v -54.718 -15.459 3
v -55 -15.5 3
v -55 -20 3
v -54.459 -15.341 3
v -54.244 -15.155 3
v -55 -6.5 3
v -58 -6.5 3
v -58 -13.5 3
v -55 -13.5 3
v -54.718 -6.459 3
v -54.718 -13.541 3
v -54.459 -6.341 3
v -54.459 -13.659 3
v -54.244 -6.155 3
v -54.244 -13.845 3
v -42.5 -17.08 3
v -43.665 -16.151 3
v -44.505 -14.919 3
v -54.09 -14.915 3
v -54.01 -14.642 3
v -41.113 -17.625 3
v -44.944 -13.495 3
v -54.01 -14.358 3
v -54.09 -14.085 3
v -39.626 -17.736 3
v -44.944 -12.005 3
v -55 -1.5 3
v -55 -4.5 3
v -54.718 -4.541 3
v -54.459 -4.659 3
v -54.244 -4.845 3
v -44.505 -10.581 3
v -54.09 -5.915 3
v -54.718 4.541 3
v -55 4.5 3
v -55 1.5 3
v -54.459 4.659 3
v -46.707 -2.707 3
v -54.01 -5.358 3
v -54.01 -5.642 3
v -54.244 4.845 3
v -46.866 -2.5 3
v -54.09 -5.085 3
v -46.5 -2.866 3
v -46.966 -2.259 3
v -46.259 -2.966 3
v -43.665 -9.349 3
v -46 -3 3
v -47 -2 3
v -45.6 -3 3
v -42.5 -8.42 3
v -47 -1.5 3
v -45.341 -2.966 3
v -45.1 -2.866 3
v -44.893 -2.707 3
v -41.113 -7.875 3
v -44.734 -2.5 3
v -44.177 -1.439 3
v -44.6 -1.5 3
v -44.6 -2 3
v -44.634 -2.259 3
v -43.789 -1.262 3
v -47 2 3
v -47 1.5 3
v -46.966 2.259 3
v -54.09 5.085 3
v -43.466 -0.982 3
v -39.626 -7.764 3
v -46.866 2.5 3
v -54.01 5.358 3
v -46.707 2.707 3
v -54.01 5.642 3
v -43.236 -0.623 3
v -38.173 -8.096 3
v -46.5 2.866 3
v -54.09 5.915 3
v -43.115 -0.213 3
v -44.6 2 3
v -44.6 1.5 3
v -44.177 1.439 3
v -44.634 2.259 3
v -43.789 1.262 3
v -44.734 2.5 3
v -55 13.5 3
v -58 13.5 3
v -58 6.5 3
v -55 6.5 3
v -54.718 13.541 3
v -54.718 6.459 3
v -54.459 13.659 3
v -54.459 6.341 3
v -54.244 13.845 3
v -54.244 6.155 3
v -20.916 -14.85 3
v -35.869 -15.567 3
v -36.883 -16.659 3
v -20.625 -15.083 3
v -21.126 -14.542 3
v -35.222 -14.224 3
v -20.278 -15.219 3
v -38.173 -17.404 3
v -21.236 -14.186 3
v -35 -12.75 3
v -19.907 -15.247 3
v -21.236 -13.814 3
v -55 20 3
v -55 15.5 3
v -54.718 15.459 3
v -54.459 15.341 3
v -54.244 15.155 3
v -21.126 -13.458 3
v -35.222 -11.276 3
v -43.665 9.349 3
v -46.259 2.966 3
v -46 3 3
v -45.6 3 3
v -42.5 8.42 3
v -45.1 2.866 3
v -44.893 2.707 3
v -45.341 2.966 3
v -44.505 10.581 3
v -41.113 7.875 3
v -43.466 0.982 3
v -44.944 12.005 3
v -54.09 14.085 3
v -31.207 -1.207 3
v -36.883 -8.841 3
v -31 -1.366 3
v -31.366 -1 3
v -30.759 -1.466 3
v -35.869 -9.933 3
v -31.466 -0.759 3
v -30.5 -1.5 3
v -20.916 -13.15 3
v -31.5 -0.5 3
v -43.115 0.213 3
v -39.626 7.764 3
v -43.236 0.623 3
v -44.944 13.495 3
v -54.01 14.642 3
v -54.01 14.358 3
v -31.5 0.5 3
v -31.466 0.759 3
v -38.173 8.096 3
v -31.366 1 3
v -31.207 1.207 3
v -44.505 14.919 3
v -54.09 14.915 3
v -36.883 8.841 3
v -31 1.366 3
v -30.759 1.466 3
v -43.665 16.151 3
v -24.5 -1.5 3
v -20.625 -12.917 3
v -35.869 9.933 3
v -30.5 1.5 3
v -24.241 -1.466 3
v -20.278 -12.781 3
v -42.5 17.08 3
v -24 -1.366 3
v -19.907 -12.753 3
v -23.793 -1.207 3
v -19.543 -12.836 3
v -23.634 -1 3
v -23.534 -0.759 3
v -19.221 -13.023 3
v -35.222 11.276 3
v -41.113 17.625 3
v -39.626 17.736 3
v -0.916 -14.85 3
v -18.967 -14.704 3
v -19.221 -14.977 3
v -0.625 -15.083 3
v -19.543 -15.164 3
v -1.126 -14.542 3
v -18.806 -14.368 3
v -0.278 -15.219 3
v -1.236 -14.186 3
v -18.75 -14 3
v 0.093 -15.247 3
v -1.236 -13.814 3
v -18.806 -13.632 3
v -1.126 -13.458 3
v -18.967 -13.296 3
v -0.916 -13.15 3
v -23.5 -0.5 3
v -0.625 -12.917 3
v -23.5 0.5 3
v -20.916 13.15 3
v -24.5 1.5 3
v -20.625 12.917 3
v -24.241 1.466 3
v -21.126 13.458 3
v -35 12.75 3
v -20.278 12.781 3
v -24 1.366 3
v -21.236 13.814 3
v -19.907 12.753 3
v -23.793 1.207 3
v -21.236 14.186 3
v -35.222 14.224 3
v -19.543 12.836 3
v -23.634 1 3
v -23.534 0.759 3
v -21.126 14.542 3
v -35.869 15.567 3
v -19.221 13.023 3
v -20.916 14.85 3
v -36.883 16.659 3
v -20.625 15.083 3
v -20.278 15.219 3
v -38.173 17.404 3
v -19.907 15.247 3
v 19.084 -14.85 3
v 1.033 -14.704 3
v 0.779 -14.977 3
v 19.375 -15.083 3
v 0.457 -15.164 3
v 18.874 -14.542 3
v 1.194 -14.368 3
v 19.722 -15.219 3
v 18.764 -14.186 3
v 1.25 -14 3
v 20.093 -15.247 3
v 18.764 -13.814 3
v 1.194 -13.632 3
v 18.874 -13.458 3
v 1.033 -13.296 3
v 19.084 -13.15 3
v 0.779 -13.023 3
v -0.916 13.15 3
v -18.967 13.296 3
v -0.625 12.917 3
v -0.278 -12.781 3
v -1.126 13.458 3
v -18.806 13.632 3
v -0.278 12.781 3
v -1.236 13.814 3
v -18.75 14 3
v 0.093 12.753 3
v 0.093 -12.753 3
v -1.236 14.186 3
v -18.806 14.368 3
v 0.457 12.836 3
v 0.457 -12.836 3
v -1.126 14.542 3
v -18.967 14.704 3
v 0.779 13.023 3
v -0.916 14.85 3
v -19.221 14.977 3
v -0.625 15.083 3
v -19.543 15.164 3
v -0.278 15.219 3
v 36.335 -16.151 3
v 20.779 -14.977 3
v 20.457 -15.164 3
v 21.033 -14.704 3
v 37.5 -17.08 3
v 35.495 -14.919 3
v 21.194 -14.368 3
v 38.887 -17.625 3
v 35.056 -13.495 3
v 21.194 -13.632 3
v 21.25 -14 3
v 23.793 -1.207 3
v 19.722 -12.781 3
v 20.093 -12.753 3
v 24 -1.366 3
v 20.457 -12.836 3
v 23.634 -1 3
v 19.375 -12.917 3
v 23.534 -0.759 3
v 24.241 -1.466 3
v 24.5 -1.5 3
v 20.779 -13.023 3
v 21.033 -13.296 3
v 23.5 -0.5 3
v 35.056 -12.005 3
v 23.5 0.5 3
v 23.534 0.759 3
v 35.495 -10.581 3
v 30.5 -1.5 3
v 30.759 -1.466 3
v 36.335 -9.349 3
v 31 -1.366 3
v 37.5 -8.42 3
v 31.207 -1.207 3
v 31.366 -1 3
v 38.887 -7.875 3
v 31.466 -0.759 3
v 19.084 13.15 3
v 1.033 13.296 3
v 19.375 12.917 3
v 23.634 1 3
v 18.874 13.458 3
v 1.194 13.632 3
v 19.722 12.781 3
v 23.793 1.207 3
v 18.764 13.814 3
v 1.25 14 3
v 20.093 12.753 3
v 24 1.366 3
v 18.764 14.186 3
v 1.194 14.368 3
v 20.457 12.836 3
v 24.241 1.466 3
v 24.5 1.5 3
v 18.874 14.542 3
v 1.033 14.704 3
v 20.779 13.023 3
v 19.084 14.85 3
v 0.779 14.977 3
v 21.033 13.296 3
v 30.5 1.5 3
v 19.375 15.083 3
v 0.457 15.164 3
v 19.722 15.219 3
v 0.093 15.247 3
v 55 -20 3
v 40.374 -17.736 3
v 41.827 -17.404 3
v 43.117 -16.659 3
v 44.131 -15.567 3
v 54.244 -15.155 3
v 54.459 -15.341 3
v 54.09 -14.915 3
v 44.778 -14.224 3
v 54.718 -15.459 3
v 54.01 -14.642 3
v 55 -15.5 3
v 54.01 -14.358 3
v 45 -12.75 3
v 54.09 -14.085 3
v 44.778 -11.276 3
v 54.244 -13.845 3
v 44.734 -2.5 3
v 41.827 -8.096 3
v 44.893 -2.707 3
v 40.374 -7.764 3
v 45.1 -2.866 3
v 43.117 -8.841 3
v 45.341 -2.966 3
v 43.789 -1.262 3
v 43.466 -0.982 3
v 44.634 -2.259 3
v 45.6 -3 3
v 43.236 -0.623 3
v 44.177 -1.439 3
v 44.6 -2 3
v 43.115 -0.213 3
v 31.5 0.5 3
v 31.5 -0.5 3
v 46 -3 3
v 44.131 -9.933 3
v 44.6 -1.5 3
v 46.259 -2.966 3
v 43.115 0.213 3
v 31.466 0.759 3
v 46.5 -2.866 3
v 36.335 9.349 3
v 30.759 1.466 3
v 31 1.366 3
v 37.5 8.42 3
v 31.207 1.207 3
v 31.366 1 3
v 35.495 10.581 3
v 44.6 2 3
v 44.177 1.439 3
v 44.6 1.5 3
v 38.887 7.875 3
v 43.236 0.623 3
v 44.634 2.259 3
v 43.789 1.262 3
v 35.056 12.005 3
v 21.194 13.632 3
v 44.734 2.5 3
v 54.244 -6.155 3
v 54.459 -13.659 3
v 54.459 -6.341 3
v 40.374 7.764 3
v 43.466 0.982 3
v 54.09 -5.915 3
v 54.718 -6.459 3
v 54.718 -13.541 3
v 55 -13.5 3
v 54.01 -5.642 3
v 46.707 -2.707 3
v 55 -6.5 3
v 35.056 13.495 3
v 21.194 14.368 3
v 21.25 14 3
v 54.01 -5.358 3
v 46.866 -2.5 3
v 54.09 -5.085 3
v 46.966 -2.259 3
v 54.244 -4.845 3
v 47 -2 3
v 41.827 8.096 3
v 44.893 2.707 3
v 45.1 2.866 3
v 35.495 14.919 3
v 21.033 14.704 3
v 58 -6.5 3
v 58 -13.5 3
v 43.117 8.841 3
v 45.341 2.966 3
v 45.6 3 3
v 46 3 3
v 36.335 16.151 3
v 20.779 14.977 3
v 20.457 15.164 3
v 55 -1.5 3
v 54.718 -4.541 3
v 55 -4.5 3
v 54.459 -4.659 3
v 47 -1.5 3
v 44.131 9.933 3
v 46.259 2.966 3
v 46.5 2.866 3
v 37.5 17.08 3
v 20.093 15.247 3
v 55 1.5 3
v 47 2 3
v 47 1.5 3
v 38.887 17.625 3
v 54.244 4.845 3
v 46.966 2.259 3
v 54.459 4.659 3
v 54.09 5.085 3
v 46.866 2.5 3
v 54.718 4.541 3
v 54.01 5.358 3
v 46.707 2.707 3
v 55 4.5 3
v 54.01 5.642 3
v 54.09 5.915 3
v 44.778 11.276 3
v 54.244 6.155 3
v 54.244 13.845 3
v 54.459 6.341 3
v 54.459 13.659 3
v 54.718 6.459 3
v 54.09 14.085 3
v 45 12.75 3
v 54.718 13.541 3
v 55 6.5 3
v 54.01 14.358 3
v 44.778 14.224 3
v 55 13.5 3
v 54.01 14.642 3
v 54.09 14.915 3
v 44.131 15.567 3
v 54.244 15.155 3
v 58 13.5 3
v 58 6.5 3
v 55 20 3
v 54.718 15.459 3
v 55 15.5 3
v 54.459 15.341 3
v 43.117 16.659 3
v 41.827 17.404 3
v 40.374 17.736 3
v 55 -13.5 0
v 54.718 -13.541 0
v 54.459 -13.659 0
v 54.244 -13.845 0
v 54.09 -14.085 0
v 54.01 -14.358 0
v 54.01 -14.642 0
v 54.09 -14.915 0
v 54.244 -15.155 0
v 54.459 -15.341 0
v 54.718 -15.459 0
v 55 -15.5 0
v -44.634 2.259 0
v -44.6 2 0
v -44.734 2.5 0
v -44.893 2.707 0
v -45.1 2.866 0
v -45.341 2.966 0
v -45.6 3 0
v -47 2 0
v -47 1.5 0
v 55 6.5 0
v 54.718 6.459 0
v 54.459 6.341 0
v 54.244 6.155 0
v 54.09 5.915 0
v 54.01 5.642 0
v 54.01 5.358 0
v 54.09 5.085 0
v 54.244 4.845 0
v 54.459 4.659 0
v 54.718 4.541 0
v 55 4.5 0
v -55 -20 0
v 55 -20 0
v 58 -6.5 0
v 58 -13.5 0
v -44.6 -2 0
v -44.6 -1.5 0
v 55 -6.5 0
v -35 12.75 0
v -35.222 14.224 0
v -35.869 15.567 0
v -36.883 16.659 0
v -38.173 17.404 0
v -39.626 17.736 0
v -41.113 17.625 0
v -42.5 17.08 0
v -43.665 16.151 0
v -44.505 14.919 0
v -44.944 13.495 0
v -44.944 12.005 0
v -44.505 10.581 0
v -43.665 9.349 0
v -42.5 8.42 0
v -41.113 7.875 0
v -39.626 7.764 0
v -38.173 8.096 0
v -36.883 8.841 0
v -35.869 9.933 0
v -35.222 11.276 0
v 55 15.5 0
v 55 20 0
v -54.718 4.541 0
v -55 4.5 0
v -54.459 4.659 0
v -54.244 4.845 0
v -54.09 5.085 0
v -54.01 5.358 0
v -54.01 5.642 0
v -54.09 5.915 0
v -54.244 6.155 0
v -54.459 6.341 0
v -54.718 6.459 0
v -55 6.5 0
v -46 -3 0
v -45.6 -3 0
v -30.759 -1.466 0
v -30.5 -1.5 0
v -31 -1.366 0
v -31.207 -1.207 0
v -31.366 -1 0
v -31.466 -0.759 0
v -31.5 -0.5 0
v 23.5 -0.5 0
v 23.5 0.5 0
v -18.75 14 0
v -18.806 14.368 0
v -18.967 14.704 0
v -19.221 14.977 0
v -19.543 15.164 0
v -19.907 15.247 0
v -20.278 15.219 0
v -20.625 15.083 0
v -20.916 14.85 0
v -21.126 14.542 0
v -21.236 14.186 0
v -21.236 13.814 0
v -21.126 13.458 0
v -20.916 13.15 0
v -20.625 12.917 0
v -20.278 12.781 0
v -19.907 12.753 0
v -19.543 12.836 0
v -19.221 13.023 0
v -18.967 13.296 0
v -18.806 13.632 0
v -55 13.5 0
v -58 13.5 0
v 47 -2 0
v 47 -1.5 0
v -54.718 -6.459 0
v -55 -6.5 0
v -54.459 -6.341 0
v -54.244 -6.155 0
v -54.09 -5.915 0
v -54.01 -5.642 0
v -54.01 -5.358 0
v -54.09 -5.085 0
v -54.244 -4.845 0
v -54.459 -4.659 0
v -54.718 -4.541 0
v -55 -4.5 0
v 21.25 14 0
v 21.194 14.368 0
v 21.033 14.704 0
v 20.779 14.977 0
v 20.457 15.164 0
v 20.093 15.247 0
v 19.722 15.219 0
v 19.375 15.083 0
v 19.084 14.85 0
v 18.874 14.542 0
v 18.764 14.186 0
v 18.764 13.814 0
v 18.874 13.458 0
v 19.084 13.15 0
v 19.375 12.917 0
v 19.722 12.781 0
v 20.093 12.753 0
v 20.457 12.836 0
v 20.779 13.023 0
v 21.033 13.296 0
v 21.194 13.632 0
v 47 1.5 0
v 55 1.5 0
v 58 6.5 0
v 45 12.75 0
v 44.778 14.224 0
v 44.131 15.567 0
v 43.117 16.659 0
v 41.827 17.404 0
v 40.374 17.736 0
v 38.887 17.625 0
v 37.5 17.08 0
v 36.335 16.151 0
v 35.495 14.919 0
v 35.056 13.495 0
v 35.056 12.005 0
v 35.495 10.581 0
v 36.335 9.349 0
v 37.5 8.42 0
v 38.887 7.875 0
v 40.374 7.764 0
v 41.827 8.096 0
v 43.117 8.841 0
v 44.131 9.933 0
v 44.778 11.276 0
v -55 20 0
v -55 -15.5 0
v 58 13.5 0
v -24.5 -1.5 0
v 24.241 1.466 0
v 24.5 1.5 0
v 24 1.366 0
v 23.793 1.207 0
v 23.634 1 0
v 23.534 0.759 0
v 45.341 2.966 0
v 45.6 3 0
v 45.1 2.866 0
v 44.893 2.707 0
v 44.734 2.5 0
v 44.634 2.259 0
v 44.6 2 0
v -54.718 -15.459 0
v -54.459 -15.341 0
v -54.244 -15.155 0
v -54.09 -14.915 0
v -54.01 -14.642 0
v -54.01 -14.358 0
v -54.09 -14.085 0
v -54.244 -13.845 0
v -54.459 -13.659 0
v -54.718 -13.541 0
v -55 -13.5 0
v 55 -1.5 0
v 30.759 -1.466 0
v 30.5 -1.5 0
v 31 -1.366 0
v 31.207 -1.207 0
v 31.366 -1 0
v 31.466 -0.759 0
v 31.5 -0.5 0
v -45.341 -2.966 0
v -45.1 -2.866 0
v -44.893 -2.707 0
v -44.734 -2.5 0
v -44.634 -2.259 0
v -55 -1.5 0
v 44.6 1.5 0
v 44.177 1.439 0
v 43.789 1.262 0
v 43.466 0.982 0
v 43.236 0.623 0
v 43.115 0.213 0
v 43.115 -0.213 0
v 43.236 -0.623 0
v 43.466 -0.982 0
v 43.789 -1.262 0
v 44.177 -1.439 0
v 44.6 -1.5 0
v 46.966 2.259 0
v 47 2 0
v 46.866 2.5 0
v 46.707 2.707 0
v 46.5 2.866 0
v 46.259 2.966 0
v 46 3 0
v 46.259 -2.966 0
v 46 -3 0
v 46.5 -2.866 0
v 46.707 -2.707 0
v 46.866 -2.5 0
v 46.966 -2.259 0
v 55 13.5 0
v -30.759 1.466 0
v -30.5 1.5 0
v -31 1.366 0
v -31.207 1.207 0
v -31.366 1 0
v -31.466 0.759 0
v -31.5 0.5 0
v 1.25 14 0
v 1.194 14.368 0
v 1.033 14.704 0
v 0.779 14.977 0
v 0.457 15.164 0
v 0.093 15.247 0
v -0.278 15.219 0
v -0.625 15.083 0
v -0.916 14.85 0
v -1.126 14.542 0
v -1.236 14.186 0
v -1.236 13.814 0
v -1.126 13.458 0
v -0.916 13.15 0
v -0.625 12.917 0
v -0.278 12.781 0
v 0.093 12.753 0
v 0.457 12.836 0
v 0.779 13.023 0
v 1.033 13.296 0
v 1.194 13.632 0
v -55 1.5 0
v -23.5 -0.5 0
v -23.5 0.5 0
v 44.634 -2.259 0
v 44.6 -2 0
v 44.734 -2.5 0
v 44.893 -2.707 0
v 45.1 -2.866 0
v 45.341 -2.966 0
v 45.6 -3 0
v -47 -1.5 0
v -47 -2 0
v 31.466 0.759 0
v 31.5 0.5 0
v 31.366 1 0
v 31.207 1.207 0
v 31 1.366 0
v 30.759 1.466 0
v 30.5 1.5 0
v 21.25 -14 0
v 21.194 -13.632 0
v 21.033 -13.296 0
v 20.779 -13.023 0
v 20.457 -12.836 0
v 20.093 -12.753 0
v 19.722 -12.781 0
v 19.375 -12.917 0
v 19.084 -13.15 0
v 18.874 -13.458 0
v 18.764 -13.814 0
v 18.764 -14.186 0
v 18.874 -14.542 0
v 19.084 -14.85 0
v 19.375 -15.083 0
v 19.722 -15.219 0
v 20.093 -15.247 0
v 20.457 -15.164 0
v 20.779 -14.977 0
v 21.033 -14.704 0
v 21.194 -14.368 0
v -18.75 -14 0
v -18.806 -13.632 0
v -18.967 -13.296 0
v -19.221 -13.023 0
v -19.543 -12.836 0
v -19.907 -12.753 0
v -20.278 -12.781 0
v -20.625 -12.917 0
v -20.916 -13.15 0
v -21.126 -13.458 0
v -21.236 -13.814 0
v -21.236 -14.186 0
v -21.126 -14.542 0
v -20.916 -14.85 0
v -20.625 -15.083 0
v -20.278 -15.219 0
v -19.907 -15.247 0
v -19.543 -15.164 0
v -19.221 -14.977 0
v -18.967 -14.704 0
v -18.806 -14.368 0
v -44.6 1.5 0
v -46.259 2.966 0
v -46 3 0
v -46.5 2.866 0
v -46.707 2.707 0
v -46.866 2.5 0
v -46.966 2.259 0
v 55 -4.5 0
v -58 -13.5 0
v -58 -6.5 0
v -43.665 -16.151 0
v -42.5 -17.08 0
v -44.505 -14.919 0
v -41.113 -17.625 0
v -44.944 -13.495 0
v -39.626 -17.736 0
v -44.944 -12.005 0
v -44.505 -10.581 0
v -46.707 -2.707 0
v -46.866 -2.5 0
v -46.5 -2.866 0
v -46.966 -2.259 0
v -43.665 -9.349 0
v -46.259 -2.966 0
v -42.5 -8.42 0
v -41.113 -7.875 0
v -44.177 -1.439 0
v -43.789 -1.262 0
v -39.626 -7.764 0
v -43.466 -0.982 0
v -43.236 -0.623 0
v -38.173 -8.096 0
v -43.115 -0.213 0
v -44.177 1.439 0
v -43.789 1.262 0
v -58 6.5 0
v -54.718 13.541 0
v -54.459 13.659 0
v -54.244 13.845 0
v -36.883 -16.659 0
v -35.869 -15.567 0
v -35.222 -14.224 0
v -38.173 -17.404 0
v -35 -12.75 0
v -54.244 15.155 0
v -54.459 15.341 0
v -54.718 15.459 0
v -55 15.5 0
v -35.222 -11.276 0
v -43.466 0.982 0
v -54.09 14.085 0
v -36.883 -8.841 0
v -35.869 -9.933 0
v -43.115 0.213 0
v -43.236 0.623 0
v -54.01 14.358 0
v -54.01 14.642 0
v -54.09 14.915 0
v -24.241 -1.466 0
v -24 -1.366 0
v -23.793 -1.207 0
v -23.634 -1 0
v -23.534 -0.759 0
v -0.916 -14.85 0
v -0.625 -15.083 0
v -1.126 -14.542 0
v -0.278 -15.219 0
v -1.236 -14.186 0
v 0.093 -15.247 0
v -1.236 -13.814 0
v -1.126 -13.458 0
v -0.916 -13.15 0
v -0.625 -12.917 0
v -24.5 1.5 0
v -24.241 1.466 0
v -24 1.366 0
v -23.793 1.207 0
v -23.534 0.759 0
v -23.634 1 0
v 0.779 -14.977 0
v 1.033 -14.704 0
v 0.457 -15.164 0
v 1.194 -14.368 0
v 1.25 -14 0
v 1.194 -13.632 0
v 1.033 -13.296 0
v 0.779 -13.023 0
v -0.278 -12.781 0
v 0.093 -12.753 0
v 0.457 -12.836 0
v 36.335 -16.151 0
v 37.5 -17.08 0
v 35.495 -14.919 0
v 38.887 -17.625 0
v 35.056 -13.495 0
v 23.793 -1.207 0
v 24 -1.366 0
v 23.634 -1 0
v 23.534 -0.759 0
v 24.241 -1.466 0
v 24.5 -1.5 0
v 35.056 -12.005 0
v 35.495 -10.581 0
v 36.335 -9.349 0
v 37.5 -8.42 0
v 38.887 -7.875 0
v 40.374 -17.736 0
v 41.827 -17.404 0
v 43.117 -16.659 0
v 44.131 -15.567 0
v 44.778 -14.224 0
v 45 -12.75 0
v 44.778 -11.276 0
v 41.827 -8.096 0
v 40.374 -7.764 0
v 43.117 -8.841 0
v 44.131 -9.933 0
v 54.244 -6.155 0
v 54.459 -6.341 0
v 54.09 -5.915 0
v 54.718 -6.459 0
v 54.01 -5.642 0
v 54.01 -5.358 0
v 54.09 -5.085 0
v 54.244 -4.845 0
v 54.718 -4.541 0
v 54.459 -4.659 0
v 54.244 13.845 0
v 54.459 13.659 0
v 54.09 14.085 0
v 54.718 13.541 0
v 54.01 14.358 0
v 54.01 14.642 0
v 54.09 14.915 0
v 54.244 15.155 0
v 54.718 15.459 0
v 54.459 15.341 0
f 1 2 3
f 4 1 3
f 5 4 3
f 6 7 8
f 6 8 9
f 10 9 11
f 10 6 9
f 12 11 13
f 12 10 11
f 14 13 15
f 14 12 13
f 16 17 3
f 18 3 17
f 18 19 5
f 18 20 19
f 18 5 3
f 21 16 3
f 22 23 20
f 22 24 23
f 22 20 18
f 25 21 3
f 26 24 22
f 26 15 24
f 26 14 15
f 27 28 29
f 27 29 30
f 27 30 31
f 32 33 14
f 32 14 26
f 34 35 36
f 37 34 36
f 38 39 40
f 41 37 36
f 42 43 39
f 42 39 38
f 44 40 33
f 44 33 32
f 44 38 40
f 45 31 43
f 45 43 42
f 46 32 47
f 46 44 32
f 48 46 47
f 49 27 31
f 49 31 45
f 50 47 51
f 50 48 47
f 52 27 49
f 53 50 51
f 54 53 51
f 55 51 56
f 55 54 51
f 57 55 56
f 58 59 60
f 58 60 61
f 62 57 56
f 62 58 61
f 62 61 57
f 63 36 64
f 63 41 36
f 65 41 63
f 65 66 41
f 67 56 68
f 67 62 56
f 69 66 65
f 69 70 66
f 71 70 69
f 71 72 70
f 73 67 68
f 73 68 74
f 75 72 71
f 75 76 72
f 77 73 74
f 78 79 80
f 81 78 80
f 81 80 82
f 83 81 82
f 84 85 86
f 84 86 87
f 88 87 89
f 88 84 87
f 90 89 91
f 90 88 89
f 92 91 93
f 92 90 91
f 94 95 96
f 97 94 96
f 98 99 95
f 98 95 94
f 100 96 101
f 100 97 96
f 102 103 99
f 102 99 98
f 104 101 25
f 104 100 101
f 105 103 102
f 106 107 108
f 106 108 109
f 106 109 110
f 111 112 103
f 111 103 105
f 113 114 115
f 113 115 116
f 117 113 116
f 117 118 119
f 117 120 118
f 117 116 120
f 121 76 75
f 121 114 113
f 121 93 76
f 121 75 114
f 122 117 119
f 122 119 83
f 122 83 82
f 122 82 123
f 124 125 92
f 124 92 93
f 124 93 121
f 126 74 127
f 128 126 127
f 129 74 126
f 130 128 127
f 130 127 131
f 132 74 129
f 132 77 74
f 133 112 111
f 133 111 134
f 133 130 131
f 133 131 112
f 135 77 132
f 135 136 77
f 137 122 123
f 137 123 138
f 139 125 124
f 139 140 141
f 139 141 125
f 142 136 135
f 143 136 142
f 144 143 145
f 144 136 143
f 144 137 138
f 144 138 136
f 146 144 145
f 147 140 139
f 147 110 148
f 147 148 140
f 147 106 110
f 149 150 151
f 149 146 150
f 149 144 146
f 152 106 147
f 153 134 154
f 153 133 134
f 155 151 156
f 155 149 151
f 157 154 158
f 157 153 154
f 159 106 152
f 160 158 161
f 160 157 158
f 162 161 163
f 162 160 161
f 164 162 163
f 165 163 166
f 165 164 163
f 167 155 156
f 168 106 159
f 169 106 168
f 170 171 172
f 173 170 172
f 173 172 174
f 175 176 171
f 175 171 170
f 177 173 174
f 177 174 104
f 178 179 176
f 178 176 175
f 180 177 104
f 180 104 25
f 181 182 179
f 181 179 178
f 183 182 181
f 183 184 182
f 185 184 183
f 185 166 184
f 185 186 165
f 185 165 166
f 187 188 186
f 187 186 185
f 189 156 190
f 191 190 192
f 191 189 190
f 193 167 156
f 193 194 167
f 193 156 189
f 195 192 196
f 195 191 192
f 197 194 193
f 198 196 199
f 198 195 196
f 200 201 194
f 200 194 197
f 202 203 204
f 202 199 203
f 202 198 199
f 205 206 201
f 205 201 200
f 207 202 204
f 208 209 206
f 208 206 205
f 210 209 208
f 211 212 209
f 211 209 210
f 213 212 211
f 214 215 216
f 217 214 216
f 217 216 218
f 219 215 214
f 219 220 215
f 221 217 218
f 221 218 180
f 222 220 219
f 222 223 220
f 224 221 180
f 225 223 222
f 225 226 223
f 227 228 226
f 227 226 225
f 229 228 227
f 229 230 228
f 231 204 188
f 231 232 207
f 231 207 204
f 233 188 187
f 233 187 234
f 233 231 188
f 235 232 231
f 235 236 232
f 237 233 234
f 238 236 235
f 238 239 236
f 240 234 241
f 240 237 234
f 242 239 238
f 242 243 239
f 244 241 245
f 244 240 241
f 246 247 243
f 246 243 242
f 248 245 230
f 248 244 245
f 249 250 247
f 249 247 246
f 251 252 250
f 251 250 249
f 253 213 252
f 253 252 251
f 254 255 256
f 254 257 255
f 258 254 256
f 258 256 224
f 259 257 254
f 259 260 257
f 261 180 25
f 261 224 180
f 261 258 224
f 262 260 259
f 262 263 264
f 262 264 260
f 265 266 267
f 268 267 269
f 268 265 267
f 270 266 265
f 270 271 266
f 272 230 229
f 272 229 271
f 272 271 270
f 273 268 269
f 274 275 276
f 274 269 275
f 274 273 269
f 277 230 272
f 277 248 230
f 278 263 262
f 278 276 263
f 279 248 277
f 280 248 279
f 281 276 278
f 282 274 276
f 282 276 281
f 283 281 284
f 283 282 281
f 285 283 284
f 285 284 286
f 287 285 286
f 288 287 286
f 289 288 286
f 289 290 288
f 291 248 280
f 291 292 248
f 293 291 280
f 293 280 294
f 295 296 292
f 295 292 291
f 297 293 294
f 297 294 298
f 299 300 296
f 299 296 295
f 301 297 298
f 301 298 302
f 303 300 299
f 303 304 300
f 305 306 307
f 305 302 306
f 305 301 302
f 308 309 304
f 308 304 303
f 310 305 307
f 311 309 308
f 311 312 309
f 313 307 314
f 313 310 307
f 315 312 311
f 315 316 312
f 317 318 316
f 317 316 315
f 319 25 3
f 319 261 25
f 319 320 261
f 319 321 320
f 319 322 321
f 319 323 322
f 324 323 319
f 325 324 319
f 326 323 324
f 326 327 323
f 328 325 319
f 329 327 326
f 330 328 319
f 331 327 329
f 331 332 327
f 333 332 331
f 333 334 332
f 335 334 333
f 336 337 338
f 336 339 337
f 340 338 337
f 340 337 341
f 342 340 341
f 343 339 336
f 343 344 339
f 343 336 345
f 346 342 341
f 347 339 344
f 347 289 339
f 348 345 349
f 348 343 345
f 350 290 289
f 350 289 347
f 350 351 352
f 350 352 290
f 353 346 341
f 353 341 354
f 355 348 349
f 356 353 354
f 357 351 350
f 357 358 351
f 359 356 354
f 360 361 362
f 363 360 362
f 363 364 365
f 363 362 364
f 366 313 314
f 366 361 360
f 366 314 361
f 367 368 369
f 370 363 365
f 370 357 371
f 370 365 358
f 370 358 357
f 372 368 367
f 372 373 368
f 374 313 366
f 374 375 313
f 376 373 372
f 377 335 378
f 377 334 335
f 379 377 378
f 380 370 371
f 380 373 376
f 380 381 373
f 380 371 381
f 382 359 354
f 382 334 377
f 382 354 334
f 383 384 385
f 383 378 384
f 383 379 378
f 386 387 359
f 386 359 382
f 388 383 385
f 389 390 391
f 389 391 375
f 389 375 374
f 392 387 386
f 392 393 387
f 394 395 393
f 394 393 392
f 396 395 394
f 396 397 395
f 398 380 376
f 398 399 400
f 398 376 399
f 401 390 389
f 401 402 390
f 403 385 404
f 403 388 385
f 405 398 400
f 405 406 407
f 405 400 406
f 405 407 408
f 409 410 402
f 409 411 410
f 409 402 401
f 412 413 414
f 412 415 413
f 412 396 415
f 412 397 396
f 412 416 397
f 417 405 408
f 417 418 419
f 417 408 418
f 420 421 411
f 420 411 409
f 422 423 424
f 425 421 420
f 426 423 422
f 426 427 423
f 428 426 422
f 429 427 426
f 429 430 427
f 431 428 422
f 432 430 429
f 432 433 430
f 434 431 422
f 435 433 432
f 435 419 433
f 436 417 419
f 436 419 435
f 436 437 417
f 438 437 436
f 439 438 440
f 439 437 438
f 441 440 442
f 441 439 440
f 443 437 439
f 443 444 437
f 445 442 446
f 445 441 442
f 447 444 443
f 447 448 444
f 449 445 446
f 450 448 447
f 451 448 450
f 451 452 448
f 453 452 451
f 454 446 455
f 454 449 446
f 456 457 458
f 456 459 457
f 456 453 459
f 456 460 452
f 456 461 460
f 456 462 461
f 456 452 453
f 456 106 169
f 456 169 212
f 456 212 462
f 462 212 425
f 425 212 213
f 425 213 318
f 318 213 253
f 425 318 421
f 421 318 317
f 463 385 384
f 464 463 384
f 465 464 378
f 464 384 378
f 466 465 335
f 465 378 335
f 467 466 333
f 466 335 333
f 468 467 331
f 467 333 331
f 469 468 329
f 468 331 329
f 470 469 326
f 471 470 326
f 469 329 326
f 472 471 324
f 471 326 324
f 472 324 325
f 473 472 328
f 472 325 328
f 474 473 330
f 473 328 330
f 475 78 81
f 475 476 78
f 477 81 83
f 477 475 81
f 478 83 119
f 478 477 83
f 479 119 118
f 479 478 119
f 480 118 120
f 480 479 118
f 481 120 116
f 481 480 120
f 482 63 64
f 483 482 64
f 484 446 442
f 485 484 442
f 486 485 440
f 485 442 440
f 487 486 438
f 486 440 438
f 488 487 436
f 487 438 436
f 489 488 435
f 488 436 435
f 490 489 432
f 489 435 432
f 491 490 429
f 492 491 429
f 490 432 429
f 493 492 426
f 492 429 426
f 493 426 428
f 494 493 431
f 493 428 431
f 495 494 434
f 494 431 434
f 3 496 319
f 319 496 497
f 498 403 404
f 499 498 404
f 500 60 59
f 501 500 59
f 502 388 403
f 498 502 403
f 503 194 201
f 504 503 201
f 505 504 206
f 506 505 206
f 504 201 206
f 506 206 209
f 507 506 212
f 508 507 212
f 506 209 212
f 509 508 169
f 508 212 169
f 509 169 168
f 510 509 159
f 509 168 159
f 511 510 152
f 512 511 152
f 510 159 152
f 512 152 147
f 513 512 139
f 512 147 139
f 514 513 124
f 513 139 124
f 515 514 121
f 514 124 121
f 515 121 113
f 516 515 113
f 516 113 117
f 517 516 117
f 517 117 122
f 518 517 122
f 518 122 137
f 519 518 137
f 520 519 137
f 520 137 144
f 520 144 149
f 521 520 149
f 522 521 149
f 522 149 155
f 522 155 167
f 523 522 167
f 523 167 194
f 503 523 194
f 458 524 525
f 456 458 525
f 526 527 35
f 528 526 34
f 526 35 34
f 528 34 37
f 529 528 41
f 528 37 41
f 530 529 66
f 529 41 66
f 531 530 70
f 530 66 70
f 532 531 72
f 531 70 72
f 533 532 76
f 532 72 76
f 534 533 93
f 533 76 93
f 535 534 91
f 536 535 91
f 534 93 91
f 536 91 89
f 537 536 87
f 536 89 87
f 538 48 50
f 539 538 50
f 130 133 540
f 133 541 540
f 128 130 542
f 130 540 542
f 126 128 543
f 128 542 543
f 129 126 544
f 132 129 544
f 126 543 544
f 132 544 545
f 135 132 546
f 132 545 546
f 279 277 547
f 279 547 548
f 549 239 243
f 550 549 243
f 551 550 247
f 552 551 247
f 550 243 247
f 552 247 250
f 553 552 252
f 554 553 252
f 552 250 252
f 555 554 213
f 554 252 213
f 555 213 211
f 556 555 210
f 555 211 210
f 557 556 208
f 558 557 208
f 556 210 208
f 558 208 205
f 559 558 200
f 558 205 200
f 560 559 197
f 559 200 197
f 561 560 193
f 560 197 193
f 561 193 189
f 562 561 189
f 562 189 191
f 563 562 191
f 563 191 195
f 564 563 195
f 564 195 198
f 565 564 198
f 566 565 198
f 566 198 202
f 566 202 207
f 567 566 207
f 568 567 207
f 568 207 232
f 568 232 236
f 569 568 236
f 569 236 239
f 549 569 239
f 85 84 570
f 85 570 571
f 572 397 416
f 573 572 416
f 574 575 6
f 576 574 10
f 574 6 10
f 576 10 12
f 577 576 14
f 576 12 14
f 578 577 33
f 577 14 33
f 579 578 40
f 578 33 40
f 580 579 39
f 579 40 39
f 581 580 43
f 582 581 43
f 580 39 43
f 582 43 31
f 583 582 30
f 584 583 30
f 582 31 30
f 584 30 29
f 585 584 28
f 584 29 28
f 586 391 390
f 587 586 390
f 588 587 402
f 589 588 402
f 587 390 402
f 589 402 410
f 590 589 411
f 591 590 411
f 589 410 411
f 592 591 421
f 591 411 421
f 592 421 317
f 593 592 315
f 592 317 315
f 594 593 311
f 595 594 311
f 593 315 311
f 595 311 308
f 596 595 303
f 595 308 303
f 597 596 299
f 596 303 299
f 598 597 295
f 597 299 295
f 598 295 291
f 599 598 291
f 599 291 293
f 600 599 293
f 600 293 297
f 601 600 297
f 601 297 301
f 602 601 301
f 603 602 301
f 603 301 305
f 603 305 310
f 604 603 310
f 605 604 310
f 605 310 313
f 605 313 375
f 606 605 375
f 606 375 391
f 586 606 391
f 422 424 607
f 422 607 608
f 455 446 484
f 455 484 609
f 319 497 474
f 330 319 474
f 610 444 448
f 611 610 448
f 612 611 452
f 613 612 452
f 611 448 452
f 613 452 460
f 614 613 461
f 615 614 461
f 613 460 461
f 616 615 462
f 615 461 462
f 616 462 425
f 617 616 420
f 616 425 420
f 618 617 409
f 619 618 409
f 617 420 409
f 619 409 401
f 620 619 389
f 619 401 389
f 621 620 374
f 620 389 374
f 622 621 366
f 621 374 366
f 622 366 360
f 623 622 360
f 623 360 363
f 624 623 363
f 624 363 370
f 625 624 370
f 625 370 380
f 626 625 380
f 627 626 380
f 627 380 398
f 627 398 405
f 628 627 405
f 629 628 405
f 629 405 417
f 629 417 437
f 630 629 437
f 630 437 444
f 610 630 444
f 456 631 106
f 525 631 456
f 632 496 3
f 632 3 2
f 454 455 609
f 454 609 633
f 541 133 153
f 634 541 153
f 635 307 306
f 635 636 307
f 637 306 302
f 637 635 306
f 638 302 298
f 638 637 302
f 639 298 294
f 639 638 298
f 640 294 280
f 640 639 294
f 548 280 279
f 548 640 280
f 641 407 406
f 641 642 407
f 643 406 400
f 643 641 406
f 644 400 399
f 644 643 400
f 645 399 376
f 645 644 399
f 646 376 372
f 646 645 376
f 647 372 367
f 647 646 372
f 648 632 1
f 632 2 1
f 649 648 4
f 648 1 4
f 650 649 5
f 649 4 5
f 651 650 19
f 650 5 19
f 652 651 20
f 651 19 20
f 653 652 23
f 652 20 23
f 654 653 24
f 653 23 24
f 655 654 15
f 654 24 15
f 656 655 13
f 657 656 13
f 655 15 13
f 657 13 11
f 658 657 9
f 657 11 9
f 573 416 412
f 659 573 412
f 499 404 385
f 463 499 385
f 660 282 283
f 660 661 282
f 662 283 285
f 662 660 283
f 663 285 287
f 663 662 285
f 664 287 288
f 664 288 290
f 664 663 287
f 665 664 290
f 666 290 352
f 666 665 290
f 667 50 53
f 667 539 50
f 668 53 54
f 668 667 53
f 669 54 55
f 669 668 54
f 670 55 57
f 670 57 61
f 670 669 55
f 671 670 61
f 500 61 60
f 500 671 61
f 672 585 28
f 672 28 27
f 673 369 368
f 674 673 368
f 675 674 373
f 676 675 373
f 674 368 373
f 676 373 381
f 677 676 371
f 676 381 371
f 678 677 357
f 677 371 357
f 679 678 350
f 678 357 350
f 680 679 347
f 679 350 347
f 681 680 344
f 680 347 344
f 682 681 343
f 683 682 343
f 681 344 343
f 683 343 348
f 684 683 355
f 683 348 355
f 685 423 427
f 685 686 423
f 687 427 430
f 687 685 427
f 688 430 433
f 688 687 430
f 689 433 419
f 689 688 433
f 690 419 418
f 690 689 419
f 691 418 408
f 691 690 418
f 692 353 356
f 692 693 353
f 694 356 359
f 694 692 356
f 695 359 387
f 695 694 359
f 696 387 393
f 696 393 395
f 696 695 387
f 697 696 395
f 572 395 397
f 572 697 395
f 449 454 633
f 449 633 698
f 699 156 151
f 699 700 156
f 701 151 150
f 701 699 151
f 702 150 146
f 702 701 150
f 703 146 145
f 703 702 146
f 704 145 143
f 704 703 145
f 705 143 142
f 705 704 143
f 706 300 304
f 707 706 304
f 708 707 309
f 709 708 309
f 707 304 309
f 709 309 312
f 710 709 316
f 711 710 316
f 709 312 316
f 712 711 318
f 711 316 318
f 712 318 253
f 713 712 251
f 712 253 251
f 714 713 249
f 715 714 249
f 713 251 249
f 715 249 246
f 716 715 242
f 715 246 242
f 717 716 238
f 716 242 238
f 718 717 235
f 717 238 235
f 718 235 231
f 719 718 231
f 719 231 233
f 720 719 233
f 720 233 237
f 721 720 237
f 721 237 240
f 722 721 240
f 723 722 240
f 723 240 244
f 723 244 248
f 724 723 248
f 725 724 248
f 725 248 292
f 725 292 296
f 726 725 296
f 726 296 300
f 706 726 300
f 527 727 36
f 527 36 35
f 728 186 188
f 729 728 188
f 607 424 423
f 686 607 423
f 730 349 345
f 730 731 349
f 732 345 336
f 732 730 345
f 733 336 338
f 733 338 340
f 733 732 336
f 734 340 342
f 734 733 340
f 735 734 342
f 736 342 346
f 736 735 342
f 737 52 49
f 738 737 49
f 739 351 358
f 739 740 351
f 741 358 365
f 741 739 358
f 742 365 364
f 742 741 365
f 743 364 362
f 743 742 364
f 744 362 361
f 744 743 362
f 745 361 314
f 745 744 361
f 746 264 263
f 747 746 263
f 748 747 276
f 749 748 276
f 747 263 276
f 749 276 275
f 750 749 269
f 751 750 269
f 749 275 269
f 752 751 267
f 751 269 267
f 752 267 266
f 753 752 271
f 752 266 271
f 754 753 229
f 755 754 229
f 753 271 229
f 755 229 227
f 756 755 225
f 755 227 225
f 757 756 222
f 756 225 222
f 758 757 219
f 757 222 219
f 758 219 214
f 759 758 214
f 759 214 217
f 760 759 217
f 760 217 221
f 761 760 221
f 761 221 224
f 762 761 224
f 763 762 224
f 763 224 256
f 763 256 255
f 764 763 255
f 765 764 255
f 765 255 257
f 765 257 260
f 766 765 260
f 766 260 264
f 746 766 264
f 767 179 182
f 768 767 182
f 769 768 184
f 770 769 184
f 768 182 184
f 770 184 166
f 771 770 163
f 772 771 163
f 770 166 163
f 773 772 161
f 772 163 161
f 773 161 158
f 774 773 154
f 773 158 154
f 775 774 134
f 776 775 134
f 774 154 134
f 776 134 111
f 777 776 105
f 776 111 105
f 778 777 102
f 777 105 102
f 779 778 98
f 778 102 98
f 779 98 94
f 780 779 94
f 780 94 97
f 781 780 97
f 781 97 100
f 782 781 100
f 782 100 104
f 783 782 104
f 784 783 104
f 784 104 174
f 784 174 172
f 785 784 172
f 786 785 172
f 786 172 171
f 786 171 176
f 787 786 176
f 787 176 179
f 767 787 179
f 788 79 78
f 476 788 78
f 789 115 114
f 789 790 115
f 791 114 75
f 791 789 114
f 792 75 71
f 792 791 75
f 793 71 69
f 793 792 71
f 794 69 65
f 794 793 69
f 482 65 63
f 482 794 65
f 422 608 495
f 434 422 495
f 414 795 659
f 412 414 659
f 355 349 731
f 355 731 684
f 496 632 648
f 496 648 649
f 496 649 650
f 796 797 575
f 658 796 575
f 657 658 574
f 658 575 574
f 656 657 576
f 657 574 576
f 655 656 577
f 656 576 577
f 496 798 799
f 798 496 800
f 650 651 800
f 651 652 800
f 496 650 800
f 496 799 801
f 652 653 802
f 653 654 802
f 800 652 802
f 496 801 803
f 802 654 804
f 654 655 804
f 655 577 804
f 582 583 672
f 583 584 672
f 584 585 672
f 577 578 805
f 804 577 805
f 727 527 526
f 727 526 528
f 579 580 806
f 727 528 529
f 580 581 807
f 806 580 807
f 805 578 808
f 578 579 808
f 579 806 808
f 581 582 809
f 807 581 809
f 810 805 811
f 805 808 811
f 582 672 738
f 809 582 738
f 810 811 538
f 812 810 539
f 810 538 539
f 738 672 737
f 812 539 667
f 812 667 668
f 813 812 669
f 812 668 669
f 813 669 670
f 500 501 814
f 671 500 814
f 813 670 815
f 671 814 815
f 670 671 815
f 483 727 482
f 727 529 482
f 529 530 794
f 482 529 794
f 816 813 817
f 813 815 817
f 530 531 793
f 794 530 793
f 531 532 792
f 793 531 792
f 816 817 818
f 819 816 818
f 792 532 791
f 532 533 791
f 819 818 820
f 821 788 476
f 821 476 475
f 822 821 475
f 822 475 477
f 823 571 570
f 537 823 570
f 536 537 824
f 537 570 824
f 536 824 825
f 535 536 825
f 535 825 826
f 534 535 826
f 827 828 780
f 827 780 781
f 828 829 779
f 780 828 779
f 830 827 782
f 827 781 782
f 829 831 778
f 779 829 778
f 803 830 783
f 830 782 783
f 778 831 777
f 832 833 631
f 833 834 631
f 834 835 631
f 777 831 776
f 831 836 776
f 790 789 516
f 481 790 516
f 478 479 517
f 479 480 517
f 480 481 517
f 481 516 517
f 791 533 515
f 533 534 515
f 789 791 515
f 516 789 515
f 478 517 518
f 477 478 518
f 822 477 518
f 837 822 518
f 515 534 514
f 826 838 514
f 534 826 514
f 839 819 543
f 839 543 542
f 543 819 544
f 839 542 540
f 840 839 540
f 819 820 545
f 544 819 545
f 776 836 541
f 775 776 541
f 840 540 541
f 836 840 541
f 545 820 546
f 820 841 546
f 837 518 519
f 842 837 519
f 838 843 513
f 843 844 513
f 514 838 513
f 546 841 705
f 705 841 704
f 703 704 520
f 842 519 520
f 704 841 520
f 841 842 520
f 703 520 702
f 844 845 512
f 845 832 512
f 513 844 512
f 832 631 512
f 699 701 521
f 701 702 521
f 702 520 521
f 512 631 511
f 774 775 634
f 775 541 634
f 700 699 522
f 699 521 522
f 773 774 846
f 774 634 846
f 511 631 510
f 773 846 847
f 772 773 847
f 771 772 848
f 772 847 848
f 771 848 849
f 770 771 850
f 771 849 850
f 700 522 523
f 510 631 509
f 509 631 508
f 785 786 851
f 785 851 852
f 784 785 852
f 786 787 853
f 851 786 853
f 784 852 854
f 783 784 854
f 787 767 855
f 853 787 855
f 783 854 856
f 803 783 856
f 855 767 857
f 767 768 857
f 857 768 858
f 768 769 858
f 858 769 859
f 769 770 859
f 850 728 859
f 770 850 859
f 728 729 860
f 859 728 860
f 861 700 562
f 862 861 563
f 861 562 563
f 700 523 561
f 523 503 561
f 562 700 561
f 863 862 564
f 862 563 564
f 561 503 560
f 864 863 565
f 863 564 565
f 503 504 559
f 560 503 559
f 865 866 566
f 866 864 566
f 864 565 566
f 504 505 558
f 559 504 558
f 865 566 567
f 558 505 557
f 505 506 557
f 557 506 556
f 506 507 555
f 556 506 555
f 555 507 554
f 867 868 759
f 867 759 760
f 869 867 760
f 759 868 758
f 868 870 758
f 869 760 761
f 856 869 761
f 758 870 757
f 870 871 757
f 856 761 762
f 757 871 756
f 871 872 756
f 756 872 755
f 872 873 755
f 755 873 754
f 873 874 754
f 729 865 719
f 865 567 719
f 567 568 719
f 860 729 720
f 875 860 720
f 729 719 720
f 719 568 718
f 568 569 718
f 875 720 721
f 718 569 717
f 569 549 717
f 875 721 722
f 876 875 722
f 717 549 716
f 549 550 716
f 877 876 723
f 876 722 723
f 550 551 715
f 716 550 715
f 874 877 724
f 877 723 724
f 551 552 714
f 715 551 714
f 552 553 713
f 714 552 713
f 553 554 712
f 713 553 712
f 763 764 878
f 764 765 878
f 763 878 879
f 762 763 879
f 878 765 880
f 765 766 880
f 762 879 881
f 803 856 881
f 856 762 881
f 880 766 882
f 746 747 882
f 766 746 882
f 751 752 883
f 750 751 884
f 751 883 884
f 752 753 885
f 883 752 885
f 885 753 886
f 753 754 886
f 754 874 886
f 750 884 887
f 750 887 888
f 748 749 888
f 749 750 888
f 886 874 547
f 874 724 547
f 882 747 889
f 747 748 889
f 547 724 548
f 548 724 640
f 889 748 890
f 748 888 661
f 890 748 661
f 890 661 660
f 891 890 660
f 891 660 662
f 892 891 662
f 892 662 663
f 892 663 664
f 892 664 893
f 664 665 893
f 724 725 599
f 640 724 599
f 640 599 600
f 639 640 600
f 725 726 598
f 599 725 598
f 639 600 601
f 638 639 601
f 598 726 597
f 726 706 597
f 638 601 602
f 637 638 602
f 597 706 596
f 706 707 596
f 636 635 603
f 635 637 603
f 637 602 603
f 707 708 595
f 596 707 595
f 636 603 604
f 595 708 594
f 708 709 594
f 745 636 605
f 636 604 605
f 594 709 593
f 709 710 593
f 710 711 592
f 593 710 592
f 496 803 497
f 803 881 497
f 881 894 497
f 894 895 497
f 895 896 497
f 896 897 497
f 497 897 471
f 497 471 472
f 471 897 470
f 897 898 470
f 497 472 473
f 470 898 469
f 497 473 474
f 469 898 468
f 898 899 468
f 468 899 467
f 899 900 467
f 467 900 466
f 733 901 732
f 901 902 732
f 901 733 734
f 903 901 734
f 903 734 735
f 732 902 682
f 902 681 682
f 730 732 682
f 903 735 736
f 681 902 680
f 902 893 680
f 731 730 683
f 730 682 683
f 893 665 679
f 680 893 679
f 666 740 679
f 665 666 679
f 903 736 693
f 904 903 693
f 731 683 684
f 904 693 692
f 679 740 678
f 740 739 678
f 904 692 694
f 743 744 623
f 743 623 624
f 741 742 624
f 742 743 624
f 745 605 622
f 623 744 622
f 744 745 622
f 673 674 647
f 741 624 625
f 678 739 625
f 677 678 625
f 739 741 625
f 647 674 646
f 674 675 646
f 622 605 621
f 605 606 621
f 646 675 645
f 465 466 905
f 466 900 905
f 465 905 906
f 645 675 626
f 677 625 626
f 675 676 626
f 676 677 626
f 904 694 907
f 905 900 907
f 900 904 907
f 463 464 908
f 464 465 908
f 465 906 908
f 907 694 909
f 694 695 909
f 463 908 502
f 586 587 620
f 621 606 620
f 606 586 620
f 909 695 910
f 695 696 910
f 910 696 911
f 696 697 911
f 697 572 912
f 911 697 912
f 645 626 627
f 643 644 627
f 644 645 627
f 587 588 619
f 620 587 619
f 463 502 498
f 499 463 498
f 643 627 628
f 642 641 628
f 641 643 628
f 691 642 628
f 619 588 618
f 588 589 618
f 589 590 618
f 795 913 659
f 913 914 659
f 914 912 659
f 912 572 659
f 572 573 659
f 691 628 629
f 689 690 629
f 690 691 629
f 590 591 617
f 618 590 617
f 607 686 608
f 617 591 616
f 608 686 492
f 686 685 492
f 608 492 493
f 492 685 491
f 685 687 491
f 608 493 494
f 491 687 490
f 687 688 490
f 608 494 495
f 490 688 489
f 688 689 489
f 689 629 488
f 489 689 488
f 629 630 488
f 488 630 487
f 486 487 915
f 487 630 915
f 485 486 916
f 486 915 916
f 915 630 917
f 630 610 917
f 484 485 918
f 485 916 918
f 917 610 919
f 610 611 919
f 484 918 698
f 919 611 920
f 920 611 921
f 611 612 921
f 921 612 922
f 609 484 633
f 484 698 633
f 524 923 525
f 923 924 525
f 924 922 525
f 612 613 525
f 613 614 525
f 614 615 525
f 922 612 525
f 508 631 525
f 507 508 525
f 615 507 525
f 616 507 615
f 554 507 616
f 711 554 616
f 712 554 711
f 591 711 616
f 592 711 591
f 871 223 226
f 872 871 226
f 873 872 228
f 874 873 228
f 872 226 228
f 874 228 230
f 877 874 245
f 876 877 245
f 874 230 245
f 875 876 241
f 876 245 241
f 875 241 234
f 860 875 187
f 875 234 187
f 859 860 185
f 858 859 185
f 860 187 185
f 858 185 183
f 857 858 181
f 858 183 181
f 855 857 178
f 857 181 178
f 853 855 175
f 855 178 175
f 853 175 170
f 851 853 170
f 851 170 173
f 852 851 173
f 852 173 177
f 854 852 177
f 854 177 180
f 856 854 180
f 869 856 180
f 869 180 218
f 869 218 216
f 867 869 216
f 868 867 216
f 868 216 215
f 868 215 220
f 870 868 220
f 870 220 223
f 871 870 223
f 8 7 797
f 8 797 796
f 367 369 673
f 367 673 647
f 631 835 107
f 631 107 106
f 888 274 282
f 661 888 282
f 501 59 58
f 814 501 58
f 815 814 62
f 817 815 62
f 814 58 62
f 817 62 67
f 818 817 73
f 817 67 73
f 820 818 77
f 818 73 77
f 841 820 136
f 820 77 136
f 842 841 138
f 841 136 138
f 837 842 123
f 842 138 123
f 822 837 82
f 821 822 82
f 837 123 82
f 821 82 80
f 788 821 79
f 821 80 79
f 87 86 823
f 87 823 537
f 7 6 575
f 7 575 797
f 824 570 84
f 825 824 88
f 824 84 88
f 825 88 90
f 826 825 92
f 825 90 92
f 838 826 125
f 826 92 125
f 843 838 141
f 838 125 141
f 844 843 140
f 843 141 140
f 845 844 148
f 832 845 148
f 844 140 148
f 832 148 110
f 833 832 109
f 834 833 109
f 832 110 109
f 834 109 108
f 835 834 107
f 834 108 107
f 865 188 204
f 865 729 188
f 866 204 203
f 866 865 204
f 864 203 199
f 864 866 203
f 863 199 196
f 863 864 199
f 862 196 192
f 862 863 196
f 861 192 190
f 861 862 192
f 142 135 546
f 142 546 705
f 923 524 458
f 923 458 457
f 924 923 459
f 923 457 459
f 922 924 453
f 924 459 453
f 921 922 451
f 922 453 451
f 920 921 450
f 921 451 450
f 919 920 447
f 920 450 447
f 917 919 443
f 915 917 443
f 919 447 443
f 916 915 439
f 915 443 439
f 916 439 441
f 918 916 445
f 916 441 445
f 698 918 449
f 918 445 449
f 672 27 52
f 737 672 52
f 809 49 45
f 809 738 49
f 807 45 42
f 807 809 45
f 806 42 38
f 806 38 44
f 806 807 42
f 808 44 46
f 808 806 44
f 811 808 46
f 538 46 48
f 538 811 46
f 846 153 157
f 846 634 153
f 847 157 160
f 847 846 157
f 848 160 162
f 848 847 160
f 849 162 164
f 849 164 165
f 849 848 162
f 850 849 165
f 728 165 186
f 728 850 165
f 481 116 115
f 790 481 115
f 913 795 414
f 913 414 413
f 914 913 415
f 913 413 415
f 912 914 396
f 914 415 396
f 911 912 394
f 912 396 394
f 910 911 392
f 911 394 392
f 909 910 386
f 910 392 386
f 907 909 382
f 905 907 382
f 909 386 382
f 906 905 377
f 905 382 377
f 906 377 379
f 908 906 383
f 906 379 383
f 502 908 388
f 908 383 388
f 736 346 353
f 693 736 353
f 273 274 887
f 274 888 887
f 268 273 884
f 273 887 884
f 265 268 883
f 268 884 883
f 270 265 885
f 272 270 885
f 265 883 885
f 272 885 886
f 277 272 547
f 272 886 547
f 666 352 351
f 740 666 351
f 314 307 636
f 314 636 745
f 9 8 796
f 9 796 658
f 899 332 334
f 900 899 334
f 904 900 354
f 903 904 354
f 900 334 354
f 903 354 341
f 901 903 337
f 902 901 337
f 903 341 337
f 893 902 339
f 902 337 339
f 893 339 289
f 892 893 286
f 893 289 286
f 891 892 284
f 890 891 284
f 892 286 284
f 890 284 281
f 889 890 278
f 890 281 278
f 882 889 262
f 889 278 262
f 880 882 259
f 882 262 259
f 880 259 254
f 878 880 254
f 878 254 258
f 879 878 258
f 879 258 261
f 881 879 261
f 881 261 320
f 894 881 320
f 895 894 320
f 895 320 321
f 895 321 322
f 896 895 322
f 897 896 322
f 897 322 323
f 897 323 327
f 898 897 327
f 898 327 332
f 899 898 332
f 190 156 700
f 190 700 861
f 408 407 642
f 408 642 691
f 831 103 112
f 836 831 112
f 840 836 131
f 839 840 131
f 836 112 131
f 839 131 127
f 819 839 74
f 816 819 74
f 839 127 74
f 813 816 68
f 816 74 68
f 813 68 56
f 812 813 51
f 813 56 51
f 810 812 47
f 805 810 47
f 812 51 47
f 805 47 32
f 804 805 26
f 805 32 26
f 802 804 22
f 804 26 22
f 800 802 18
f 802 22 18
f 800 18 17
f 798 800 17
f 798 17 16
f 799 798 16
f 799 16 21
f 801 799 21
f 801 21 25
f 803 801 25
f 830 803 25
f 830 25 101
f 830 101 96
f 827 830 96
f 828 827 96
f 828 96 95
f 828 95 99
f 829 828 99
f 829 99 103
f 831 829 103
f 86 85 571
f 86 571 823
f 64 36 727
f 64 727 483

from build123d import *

# Parameters (mm, degrees)
SKETCH1_W           = 110
SKETCH1_H           = 40
BOSS_EXTRUDE1_DEPTH = 3
BOSS_EXTRUDE2_DEPTH = 3
SKETCH3_R           = 1
CUT_EXTRUDE1_DEPTH  = 3
SKETCH4_W           = 8
SKETCH4_H           = 3
SKETCH4_W_2         = 2.4
SKETCH4_H_2         = 6
CUT_EXTRUDE2_DEPTH  = 3
FILLET6_R           = 1
SKETCH5_W           = 8
SKETCH5_H           = 3
CUT_EXTRUDE3_DEPTH  = 10
FILLET7_R           = 1
SKETCH6_R           = 1.25
CUT_EXTRUDE4_DEPTH  = 62.424750712
SKETCH7_R           = 5
CUT_EXTRUDE5_DEPTH  = 10


with BuildPart() as part:
    # Sketch1 → Boss-Extrude1 (new body)
    with BuildSketch(Plane.XY):
        Rectangle(SKETCH1_W, SKETCH1_H)
    extrude(amount=BOSS_EXTRUDE1_DEPTH)

    # Sketch2 → Boss-Extrude2 (add)
    with BuildSketch(Plane.XY.offset(3)):
        Polygon((58, 10), (58, 13.5), (55, 13.5), (55, 6.5), (58, 6.5), align=None)
        Polygon((55, -10), (55, -6.5), (58, -6.5), (58, -13.5), (55, -13.5), align=None)
        Polygon((-55, 6.5), (-55, 13.5), (-58, 13.5), (-58, 10), (-58, 6.5), align=None)
        Polygon((-55, -13.5), (-55, -10), (-55, -6.5), (-58, -6.5), (-58, -13.5), align=None)
    extrude(amount=-BOSS_EXTRUDE2_DEPTH)

    # Sketch3 → Cut-Extrude1 (cut)
    with BuildSketch(Plane.XY.offset(3)):
        with Locations((-55, 14.5)):
            Circle(SKETCH3_R)
        with Locations((-55, 5.5)):
            Circle(SKETCH3_R)
        with Locations((-55, -5.5)):
            Circle(SKETCH3_R)
        with Locations((-55, -14.5)):
            Circle(SKETCH3_R)
        with Locations((55, 14.5)):
            Circle(SKETCH3_R)
        with Locations((55, 5.5)):
            Circle(SKETCH3_R)
        with Locations((55, -5.5)):
            Circle(SKETCH3_R)
        with Locations((55, -14.5)):
            Circle(SKETCH3_R)
    extrude(amount=-CUT_EXTRUDE1_DEPTH, mode=Mode.SUBTRACT)

    # Sketch4 → Cut-Extrude2 (cut)
    with BuildSketch(Plane.XY.offset(3)):
        with Locations((-51, 0)):
            Rectangle(SKETCH4_W, SKETCH4_H)
        Polygon((-47, 3), (-47, 1.5), (-47, -1.5), (-47, -3), (-44.6, -3), (-44.6, -1.5), (-44.6, 1.5), (-44.6, 3), align=None)
        with BuildLine():
            ThreePointArc((-44.6, -1.5), (-43.1, 0), (-44.6, 1.5))
            Line((-44.6, 1.5), (-44.6, -1.5))
        make_face()
        with Locations((45.8, 0)):
            Rectangle(SKETCH4_W_2, SKETCH4_H_2)
        with BuildLine():
            Line((44.6, -1.5), (44.6, 1.5))
            ThreePointArc((44.6, 1.5), (43.1, 0), (44.6, -1.5))
        make_face()
        with Locations((51, 0)):
            Rectangle(SKETCH4_W, SKETCH4_H)
    extrude(amount=-CUT_EXTRUDE2_DEPTH, mode=Mode.SUBTRACT)

    # Fillet6
    fillet6_edges = [part.edges().sort_by_distance(p)[0] for p in [
        (-47, 3, 1.5),
        (-44.6, 3, 1.5),
        (-44.6, -3, 1.5),
        (-47, -3, 1.5),
        (47, 3, 1.5),
        (47, -3, 1.5),
        (44.6, -3, 1.5),
        (44.6, 3, 1.5),
    ]]
    fillet(fillet6_edges, radius=FILLET6_R)

    # Sketch5 → Cut-Extrude3 (cut)
    with BuildSketch(Plane.XY.offset(3)):
        with Locations((-27.5, 0)):
            Rectangle(SKETCH5_W, SKETCH5_H)
        with Locations((27.5, 0)):
            Rectangle(SKETCH5_W, SKETCH5_H)
    extrude(amount=-CUT_EXTRUDE3_DEPTH, mode=Mode.SUBTRACT)

    # Fillet7
    fillet7_edges = [part.edges().sort_by_distance(p)[0] for p in [
        (-23.5, 1.5, 1.5),
        (-23.5, -1.5, 1.5),
        (-31.5, -1.5, 1.5),
        (-31.5, 1.5, 1.5),
        (31.5, 1.5, 1.5),
        (31.5, -1.5, 1.5),
        (23.5, -1.5, 1.5),
        (23.5, 1.5, 1.5),
    ]]
    fillet(fillet7_edges, radius=FILLET7_R)

    # Sketch6 → Cut-Extrude4 (cut, through all)
    with BuildSketch(Plane.XY.offset(3)):
        with Locations((-40, -14)):
            Circle(SKETCH6_R)
        with Locations((-20, -14)):
            Circle(SKETCH6_R)
        with Locations((0, -14)):
            Circle(SKETCH6_R)
        with Locations((20, -14)):
            Circle(SKETCH6_R)
        with Locations((40, -14)):
            Circle(SKETCH6_R)
        with Locations((40, 14)):
            Circle(SKETCH6_R)
        with Locations((20, 14)):
            Circle(SKETCH6_R)
        with Locations((0, 14)):
            Circle(SKETCH6_R)
        with Locations((-20, 14)):
            Circle(SKETCH6_R)
        with Locations((-40, 14)):
            Circle(SKETCH6_R)
    extrude(amount=-CUT_EXTRUDE4_DEPTH, mode=Mode.SUBTRACT)

    # Sketch7 → Cut-Extrude5 (cut)
    with BuildSketch(Plane.XY.offset(3)):
        with Locations((-40, 12.75)):
            Circle(SKETCH7_R)
        with Locations((-40, -12.75)):
            Circle(SKETCH7_R)
        with Locations((40, 12.75)):
            Circle(SKETCH7_R)
        with Locations((40, -12.75)):
            Circle(SKETCH7_R)
    extrude(amount=-CUT_EXTRUDE5_DEPTH, mode=Mode.SUBTRACT)


solid = part.part
